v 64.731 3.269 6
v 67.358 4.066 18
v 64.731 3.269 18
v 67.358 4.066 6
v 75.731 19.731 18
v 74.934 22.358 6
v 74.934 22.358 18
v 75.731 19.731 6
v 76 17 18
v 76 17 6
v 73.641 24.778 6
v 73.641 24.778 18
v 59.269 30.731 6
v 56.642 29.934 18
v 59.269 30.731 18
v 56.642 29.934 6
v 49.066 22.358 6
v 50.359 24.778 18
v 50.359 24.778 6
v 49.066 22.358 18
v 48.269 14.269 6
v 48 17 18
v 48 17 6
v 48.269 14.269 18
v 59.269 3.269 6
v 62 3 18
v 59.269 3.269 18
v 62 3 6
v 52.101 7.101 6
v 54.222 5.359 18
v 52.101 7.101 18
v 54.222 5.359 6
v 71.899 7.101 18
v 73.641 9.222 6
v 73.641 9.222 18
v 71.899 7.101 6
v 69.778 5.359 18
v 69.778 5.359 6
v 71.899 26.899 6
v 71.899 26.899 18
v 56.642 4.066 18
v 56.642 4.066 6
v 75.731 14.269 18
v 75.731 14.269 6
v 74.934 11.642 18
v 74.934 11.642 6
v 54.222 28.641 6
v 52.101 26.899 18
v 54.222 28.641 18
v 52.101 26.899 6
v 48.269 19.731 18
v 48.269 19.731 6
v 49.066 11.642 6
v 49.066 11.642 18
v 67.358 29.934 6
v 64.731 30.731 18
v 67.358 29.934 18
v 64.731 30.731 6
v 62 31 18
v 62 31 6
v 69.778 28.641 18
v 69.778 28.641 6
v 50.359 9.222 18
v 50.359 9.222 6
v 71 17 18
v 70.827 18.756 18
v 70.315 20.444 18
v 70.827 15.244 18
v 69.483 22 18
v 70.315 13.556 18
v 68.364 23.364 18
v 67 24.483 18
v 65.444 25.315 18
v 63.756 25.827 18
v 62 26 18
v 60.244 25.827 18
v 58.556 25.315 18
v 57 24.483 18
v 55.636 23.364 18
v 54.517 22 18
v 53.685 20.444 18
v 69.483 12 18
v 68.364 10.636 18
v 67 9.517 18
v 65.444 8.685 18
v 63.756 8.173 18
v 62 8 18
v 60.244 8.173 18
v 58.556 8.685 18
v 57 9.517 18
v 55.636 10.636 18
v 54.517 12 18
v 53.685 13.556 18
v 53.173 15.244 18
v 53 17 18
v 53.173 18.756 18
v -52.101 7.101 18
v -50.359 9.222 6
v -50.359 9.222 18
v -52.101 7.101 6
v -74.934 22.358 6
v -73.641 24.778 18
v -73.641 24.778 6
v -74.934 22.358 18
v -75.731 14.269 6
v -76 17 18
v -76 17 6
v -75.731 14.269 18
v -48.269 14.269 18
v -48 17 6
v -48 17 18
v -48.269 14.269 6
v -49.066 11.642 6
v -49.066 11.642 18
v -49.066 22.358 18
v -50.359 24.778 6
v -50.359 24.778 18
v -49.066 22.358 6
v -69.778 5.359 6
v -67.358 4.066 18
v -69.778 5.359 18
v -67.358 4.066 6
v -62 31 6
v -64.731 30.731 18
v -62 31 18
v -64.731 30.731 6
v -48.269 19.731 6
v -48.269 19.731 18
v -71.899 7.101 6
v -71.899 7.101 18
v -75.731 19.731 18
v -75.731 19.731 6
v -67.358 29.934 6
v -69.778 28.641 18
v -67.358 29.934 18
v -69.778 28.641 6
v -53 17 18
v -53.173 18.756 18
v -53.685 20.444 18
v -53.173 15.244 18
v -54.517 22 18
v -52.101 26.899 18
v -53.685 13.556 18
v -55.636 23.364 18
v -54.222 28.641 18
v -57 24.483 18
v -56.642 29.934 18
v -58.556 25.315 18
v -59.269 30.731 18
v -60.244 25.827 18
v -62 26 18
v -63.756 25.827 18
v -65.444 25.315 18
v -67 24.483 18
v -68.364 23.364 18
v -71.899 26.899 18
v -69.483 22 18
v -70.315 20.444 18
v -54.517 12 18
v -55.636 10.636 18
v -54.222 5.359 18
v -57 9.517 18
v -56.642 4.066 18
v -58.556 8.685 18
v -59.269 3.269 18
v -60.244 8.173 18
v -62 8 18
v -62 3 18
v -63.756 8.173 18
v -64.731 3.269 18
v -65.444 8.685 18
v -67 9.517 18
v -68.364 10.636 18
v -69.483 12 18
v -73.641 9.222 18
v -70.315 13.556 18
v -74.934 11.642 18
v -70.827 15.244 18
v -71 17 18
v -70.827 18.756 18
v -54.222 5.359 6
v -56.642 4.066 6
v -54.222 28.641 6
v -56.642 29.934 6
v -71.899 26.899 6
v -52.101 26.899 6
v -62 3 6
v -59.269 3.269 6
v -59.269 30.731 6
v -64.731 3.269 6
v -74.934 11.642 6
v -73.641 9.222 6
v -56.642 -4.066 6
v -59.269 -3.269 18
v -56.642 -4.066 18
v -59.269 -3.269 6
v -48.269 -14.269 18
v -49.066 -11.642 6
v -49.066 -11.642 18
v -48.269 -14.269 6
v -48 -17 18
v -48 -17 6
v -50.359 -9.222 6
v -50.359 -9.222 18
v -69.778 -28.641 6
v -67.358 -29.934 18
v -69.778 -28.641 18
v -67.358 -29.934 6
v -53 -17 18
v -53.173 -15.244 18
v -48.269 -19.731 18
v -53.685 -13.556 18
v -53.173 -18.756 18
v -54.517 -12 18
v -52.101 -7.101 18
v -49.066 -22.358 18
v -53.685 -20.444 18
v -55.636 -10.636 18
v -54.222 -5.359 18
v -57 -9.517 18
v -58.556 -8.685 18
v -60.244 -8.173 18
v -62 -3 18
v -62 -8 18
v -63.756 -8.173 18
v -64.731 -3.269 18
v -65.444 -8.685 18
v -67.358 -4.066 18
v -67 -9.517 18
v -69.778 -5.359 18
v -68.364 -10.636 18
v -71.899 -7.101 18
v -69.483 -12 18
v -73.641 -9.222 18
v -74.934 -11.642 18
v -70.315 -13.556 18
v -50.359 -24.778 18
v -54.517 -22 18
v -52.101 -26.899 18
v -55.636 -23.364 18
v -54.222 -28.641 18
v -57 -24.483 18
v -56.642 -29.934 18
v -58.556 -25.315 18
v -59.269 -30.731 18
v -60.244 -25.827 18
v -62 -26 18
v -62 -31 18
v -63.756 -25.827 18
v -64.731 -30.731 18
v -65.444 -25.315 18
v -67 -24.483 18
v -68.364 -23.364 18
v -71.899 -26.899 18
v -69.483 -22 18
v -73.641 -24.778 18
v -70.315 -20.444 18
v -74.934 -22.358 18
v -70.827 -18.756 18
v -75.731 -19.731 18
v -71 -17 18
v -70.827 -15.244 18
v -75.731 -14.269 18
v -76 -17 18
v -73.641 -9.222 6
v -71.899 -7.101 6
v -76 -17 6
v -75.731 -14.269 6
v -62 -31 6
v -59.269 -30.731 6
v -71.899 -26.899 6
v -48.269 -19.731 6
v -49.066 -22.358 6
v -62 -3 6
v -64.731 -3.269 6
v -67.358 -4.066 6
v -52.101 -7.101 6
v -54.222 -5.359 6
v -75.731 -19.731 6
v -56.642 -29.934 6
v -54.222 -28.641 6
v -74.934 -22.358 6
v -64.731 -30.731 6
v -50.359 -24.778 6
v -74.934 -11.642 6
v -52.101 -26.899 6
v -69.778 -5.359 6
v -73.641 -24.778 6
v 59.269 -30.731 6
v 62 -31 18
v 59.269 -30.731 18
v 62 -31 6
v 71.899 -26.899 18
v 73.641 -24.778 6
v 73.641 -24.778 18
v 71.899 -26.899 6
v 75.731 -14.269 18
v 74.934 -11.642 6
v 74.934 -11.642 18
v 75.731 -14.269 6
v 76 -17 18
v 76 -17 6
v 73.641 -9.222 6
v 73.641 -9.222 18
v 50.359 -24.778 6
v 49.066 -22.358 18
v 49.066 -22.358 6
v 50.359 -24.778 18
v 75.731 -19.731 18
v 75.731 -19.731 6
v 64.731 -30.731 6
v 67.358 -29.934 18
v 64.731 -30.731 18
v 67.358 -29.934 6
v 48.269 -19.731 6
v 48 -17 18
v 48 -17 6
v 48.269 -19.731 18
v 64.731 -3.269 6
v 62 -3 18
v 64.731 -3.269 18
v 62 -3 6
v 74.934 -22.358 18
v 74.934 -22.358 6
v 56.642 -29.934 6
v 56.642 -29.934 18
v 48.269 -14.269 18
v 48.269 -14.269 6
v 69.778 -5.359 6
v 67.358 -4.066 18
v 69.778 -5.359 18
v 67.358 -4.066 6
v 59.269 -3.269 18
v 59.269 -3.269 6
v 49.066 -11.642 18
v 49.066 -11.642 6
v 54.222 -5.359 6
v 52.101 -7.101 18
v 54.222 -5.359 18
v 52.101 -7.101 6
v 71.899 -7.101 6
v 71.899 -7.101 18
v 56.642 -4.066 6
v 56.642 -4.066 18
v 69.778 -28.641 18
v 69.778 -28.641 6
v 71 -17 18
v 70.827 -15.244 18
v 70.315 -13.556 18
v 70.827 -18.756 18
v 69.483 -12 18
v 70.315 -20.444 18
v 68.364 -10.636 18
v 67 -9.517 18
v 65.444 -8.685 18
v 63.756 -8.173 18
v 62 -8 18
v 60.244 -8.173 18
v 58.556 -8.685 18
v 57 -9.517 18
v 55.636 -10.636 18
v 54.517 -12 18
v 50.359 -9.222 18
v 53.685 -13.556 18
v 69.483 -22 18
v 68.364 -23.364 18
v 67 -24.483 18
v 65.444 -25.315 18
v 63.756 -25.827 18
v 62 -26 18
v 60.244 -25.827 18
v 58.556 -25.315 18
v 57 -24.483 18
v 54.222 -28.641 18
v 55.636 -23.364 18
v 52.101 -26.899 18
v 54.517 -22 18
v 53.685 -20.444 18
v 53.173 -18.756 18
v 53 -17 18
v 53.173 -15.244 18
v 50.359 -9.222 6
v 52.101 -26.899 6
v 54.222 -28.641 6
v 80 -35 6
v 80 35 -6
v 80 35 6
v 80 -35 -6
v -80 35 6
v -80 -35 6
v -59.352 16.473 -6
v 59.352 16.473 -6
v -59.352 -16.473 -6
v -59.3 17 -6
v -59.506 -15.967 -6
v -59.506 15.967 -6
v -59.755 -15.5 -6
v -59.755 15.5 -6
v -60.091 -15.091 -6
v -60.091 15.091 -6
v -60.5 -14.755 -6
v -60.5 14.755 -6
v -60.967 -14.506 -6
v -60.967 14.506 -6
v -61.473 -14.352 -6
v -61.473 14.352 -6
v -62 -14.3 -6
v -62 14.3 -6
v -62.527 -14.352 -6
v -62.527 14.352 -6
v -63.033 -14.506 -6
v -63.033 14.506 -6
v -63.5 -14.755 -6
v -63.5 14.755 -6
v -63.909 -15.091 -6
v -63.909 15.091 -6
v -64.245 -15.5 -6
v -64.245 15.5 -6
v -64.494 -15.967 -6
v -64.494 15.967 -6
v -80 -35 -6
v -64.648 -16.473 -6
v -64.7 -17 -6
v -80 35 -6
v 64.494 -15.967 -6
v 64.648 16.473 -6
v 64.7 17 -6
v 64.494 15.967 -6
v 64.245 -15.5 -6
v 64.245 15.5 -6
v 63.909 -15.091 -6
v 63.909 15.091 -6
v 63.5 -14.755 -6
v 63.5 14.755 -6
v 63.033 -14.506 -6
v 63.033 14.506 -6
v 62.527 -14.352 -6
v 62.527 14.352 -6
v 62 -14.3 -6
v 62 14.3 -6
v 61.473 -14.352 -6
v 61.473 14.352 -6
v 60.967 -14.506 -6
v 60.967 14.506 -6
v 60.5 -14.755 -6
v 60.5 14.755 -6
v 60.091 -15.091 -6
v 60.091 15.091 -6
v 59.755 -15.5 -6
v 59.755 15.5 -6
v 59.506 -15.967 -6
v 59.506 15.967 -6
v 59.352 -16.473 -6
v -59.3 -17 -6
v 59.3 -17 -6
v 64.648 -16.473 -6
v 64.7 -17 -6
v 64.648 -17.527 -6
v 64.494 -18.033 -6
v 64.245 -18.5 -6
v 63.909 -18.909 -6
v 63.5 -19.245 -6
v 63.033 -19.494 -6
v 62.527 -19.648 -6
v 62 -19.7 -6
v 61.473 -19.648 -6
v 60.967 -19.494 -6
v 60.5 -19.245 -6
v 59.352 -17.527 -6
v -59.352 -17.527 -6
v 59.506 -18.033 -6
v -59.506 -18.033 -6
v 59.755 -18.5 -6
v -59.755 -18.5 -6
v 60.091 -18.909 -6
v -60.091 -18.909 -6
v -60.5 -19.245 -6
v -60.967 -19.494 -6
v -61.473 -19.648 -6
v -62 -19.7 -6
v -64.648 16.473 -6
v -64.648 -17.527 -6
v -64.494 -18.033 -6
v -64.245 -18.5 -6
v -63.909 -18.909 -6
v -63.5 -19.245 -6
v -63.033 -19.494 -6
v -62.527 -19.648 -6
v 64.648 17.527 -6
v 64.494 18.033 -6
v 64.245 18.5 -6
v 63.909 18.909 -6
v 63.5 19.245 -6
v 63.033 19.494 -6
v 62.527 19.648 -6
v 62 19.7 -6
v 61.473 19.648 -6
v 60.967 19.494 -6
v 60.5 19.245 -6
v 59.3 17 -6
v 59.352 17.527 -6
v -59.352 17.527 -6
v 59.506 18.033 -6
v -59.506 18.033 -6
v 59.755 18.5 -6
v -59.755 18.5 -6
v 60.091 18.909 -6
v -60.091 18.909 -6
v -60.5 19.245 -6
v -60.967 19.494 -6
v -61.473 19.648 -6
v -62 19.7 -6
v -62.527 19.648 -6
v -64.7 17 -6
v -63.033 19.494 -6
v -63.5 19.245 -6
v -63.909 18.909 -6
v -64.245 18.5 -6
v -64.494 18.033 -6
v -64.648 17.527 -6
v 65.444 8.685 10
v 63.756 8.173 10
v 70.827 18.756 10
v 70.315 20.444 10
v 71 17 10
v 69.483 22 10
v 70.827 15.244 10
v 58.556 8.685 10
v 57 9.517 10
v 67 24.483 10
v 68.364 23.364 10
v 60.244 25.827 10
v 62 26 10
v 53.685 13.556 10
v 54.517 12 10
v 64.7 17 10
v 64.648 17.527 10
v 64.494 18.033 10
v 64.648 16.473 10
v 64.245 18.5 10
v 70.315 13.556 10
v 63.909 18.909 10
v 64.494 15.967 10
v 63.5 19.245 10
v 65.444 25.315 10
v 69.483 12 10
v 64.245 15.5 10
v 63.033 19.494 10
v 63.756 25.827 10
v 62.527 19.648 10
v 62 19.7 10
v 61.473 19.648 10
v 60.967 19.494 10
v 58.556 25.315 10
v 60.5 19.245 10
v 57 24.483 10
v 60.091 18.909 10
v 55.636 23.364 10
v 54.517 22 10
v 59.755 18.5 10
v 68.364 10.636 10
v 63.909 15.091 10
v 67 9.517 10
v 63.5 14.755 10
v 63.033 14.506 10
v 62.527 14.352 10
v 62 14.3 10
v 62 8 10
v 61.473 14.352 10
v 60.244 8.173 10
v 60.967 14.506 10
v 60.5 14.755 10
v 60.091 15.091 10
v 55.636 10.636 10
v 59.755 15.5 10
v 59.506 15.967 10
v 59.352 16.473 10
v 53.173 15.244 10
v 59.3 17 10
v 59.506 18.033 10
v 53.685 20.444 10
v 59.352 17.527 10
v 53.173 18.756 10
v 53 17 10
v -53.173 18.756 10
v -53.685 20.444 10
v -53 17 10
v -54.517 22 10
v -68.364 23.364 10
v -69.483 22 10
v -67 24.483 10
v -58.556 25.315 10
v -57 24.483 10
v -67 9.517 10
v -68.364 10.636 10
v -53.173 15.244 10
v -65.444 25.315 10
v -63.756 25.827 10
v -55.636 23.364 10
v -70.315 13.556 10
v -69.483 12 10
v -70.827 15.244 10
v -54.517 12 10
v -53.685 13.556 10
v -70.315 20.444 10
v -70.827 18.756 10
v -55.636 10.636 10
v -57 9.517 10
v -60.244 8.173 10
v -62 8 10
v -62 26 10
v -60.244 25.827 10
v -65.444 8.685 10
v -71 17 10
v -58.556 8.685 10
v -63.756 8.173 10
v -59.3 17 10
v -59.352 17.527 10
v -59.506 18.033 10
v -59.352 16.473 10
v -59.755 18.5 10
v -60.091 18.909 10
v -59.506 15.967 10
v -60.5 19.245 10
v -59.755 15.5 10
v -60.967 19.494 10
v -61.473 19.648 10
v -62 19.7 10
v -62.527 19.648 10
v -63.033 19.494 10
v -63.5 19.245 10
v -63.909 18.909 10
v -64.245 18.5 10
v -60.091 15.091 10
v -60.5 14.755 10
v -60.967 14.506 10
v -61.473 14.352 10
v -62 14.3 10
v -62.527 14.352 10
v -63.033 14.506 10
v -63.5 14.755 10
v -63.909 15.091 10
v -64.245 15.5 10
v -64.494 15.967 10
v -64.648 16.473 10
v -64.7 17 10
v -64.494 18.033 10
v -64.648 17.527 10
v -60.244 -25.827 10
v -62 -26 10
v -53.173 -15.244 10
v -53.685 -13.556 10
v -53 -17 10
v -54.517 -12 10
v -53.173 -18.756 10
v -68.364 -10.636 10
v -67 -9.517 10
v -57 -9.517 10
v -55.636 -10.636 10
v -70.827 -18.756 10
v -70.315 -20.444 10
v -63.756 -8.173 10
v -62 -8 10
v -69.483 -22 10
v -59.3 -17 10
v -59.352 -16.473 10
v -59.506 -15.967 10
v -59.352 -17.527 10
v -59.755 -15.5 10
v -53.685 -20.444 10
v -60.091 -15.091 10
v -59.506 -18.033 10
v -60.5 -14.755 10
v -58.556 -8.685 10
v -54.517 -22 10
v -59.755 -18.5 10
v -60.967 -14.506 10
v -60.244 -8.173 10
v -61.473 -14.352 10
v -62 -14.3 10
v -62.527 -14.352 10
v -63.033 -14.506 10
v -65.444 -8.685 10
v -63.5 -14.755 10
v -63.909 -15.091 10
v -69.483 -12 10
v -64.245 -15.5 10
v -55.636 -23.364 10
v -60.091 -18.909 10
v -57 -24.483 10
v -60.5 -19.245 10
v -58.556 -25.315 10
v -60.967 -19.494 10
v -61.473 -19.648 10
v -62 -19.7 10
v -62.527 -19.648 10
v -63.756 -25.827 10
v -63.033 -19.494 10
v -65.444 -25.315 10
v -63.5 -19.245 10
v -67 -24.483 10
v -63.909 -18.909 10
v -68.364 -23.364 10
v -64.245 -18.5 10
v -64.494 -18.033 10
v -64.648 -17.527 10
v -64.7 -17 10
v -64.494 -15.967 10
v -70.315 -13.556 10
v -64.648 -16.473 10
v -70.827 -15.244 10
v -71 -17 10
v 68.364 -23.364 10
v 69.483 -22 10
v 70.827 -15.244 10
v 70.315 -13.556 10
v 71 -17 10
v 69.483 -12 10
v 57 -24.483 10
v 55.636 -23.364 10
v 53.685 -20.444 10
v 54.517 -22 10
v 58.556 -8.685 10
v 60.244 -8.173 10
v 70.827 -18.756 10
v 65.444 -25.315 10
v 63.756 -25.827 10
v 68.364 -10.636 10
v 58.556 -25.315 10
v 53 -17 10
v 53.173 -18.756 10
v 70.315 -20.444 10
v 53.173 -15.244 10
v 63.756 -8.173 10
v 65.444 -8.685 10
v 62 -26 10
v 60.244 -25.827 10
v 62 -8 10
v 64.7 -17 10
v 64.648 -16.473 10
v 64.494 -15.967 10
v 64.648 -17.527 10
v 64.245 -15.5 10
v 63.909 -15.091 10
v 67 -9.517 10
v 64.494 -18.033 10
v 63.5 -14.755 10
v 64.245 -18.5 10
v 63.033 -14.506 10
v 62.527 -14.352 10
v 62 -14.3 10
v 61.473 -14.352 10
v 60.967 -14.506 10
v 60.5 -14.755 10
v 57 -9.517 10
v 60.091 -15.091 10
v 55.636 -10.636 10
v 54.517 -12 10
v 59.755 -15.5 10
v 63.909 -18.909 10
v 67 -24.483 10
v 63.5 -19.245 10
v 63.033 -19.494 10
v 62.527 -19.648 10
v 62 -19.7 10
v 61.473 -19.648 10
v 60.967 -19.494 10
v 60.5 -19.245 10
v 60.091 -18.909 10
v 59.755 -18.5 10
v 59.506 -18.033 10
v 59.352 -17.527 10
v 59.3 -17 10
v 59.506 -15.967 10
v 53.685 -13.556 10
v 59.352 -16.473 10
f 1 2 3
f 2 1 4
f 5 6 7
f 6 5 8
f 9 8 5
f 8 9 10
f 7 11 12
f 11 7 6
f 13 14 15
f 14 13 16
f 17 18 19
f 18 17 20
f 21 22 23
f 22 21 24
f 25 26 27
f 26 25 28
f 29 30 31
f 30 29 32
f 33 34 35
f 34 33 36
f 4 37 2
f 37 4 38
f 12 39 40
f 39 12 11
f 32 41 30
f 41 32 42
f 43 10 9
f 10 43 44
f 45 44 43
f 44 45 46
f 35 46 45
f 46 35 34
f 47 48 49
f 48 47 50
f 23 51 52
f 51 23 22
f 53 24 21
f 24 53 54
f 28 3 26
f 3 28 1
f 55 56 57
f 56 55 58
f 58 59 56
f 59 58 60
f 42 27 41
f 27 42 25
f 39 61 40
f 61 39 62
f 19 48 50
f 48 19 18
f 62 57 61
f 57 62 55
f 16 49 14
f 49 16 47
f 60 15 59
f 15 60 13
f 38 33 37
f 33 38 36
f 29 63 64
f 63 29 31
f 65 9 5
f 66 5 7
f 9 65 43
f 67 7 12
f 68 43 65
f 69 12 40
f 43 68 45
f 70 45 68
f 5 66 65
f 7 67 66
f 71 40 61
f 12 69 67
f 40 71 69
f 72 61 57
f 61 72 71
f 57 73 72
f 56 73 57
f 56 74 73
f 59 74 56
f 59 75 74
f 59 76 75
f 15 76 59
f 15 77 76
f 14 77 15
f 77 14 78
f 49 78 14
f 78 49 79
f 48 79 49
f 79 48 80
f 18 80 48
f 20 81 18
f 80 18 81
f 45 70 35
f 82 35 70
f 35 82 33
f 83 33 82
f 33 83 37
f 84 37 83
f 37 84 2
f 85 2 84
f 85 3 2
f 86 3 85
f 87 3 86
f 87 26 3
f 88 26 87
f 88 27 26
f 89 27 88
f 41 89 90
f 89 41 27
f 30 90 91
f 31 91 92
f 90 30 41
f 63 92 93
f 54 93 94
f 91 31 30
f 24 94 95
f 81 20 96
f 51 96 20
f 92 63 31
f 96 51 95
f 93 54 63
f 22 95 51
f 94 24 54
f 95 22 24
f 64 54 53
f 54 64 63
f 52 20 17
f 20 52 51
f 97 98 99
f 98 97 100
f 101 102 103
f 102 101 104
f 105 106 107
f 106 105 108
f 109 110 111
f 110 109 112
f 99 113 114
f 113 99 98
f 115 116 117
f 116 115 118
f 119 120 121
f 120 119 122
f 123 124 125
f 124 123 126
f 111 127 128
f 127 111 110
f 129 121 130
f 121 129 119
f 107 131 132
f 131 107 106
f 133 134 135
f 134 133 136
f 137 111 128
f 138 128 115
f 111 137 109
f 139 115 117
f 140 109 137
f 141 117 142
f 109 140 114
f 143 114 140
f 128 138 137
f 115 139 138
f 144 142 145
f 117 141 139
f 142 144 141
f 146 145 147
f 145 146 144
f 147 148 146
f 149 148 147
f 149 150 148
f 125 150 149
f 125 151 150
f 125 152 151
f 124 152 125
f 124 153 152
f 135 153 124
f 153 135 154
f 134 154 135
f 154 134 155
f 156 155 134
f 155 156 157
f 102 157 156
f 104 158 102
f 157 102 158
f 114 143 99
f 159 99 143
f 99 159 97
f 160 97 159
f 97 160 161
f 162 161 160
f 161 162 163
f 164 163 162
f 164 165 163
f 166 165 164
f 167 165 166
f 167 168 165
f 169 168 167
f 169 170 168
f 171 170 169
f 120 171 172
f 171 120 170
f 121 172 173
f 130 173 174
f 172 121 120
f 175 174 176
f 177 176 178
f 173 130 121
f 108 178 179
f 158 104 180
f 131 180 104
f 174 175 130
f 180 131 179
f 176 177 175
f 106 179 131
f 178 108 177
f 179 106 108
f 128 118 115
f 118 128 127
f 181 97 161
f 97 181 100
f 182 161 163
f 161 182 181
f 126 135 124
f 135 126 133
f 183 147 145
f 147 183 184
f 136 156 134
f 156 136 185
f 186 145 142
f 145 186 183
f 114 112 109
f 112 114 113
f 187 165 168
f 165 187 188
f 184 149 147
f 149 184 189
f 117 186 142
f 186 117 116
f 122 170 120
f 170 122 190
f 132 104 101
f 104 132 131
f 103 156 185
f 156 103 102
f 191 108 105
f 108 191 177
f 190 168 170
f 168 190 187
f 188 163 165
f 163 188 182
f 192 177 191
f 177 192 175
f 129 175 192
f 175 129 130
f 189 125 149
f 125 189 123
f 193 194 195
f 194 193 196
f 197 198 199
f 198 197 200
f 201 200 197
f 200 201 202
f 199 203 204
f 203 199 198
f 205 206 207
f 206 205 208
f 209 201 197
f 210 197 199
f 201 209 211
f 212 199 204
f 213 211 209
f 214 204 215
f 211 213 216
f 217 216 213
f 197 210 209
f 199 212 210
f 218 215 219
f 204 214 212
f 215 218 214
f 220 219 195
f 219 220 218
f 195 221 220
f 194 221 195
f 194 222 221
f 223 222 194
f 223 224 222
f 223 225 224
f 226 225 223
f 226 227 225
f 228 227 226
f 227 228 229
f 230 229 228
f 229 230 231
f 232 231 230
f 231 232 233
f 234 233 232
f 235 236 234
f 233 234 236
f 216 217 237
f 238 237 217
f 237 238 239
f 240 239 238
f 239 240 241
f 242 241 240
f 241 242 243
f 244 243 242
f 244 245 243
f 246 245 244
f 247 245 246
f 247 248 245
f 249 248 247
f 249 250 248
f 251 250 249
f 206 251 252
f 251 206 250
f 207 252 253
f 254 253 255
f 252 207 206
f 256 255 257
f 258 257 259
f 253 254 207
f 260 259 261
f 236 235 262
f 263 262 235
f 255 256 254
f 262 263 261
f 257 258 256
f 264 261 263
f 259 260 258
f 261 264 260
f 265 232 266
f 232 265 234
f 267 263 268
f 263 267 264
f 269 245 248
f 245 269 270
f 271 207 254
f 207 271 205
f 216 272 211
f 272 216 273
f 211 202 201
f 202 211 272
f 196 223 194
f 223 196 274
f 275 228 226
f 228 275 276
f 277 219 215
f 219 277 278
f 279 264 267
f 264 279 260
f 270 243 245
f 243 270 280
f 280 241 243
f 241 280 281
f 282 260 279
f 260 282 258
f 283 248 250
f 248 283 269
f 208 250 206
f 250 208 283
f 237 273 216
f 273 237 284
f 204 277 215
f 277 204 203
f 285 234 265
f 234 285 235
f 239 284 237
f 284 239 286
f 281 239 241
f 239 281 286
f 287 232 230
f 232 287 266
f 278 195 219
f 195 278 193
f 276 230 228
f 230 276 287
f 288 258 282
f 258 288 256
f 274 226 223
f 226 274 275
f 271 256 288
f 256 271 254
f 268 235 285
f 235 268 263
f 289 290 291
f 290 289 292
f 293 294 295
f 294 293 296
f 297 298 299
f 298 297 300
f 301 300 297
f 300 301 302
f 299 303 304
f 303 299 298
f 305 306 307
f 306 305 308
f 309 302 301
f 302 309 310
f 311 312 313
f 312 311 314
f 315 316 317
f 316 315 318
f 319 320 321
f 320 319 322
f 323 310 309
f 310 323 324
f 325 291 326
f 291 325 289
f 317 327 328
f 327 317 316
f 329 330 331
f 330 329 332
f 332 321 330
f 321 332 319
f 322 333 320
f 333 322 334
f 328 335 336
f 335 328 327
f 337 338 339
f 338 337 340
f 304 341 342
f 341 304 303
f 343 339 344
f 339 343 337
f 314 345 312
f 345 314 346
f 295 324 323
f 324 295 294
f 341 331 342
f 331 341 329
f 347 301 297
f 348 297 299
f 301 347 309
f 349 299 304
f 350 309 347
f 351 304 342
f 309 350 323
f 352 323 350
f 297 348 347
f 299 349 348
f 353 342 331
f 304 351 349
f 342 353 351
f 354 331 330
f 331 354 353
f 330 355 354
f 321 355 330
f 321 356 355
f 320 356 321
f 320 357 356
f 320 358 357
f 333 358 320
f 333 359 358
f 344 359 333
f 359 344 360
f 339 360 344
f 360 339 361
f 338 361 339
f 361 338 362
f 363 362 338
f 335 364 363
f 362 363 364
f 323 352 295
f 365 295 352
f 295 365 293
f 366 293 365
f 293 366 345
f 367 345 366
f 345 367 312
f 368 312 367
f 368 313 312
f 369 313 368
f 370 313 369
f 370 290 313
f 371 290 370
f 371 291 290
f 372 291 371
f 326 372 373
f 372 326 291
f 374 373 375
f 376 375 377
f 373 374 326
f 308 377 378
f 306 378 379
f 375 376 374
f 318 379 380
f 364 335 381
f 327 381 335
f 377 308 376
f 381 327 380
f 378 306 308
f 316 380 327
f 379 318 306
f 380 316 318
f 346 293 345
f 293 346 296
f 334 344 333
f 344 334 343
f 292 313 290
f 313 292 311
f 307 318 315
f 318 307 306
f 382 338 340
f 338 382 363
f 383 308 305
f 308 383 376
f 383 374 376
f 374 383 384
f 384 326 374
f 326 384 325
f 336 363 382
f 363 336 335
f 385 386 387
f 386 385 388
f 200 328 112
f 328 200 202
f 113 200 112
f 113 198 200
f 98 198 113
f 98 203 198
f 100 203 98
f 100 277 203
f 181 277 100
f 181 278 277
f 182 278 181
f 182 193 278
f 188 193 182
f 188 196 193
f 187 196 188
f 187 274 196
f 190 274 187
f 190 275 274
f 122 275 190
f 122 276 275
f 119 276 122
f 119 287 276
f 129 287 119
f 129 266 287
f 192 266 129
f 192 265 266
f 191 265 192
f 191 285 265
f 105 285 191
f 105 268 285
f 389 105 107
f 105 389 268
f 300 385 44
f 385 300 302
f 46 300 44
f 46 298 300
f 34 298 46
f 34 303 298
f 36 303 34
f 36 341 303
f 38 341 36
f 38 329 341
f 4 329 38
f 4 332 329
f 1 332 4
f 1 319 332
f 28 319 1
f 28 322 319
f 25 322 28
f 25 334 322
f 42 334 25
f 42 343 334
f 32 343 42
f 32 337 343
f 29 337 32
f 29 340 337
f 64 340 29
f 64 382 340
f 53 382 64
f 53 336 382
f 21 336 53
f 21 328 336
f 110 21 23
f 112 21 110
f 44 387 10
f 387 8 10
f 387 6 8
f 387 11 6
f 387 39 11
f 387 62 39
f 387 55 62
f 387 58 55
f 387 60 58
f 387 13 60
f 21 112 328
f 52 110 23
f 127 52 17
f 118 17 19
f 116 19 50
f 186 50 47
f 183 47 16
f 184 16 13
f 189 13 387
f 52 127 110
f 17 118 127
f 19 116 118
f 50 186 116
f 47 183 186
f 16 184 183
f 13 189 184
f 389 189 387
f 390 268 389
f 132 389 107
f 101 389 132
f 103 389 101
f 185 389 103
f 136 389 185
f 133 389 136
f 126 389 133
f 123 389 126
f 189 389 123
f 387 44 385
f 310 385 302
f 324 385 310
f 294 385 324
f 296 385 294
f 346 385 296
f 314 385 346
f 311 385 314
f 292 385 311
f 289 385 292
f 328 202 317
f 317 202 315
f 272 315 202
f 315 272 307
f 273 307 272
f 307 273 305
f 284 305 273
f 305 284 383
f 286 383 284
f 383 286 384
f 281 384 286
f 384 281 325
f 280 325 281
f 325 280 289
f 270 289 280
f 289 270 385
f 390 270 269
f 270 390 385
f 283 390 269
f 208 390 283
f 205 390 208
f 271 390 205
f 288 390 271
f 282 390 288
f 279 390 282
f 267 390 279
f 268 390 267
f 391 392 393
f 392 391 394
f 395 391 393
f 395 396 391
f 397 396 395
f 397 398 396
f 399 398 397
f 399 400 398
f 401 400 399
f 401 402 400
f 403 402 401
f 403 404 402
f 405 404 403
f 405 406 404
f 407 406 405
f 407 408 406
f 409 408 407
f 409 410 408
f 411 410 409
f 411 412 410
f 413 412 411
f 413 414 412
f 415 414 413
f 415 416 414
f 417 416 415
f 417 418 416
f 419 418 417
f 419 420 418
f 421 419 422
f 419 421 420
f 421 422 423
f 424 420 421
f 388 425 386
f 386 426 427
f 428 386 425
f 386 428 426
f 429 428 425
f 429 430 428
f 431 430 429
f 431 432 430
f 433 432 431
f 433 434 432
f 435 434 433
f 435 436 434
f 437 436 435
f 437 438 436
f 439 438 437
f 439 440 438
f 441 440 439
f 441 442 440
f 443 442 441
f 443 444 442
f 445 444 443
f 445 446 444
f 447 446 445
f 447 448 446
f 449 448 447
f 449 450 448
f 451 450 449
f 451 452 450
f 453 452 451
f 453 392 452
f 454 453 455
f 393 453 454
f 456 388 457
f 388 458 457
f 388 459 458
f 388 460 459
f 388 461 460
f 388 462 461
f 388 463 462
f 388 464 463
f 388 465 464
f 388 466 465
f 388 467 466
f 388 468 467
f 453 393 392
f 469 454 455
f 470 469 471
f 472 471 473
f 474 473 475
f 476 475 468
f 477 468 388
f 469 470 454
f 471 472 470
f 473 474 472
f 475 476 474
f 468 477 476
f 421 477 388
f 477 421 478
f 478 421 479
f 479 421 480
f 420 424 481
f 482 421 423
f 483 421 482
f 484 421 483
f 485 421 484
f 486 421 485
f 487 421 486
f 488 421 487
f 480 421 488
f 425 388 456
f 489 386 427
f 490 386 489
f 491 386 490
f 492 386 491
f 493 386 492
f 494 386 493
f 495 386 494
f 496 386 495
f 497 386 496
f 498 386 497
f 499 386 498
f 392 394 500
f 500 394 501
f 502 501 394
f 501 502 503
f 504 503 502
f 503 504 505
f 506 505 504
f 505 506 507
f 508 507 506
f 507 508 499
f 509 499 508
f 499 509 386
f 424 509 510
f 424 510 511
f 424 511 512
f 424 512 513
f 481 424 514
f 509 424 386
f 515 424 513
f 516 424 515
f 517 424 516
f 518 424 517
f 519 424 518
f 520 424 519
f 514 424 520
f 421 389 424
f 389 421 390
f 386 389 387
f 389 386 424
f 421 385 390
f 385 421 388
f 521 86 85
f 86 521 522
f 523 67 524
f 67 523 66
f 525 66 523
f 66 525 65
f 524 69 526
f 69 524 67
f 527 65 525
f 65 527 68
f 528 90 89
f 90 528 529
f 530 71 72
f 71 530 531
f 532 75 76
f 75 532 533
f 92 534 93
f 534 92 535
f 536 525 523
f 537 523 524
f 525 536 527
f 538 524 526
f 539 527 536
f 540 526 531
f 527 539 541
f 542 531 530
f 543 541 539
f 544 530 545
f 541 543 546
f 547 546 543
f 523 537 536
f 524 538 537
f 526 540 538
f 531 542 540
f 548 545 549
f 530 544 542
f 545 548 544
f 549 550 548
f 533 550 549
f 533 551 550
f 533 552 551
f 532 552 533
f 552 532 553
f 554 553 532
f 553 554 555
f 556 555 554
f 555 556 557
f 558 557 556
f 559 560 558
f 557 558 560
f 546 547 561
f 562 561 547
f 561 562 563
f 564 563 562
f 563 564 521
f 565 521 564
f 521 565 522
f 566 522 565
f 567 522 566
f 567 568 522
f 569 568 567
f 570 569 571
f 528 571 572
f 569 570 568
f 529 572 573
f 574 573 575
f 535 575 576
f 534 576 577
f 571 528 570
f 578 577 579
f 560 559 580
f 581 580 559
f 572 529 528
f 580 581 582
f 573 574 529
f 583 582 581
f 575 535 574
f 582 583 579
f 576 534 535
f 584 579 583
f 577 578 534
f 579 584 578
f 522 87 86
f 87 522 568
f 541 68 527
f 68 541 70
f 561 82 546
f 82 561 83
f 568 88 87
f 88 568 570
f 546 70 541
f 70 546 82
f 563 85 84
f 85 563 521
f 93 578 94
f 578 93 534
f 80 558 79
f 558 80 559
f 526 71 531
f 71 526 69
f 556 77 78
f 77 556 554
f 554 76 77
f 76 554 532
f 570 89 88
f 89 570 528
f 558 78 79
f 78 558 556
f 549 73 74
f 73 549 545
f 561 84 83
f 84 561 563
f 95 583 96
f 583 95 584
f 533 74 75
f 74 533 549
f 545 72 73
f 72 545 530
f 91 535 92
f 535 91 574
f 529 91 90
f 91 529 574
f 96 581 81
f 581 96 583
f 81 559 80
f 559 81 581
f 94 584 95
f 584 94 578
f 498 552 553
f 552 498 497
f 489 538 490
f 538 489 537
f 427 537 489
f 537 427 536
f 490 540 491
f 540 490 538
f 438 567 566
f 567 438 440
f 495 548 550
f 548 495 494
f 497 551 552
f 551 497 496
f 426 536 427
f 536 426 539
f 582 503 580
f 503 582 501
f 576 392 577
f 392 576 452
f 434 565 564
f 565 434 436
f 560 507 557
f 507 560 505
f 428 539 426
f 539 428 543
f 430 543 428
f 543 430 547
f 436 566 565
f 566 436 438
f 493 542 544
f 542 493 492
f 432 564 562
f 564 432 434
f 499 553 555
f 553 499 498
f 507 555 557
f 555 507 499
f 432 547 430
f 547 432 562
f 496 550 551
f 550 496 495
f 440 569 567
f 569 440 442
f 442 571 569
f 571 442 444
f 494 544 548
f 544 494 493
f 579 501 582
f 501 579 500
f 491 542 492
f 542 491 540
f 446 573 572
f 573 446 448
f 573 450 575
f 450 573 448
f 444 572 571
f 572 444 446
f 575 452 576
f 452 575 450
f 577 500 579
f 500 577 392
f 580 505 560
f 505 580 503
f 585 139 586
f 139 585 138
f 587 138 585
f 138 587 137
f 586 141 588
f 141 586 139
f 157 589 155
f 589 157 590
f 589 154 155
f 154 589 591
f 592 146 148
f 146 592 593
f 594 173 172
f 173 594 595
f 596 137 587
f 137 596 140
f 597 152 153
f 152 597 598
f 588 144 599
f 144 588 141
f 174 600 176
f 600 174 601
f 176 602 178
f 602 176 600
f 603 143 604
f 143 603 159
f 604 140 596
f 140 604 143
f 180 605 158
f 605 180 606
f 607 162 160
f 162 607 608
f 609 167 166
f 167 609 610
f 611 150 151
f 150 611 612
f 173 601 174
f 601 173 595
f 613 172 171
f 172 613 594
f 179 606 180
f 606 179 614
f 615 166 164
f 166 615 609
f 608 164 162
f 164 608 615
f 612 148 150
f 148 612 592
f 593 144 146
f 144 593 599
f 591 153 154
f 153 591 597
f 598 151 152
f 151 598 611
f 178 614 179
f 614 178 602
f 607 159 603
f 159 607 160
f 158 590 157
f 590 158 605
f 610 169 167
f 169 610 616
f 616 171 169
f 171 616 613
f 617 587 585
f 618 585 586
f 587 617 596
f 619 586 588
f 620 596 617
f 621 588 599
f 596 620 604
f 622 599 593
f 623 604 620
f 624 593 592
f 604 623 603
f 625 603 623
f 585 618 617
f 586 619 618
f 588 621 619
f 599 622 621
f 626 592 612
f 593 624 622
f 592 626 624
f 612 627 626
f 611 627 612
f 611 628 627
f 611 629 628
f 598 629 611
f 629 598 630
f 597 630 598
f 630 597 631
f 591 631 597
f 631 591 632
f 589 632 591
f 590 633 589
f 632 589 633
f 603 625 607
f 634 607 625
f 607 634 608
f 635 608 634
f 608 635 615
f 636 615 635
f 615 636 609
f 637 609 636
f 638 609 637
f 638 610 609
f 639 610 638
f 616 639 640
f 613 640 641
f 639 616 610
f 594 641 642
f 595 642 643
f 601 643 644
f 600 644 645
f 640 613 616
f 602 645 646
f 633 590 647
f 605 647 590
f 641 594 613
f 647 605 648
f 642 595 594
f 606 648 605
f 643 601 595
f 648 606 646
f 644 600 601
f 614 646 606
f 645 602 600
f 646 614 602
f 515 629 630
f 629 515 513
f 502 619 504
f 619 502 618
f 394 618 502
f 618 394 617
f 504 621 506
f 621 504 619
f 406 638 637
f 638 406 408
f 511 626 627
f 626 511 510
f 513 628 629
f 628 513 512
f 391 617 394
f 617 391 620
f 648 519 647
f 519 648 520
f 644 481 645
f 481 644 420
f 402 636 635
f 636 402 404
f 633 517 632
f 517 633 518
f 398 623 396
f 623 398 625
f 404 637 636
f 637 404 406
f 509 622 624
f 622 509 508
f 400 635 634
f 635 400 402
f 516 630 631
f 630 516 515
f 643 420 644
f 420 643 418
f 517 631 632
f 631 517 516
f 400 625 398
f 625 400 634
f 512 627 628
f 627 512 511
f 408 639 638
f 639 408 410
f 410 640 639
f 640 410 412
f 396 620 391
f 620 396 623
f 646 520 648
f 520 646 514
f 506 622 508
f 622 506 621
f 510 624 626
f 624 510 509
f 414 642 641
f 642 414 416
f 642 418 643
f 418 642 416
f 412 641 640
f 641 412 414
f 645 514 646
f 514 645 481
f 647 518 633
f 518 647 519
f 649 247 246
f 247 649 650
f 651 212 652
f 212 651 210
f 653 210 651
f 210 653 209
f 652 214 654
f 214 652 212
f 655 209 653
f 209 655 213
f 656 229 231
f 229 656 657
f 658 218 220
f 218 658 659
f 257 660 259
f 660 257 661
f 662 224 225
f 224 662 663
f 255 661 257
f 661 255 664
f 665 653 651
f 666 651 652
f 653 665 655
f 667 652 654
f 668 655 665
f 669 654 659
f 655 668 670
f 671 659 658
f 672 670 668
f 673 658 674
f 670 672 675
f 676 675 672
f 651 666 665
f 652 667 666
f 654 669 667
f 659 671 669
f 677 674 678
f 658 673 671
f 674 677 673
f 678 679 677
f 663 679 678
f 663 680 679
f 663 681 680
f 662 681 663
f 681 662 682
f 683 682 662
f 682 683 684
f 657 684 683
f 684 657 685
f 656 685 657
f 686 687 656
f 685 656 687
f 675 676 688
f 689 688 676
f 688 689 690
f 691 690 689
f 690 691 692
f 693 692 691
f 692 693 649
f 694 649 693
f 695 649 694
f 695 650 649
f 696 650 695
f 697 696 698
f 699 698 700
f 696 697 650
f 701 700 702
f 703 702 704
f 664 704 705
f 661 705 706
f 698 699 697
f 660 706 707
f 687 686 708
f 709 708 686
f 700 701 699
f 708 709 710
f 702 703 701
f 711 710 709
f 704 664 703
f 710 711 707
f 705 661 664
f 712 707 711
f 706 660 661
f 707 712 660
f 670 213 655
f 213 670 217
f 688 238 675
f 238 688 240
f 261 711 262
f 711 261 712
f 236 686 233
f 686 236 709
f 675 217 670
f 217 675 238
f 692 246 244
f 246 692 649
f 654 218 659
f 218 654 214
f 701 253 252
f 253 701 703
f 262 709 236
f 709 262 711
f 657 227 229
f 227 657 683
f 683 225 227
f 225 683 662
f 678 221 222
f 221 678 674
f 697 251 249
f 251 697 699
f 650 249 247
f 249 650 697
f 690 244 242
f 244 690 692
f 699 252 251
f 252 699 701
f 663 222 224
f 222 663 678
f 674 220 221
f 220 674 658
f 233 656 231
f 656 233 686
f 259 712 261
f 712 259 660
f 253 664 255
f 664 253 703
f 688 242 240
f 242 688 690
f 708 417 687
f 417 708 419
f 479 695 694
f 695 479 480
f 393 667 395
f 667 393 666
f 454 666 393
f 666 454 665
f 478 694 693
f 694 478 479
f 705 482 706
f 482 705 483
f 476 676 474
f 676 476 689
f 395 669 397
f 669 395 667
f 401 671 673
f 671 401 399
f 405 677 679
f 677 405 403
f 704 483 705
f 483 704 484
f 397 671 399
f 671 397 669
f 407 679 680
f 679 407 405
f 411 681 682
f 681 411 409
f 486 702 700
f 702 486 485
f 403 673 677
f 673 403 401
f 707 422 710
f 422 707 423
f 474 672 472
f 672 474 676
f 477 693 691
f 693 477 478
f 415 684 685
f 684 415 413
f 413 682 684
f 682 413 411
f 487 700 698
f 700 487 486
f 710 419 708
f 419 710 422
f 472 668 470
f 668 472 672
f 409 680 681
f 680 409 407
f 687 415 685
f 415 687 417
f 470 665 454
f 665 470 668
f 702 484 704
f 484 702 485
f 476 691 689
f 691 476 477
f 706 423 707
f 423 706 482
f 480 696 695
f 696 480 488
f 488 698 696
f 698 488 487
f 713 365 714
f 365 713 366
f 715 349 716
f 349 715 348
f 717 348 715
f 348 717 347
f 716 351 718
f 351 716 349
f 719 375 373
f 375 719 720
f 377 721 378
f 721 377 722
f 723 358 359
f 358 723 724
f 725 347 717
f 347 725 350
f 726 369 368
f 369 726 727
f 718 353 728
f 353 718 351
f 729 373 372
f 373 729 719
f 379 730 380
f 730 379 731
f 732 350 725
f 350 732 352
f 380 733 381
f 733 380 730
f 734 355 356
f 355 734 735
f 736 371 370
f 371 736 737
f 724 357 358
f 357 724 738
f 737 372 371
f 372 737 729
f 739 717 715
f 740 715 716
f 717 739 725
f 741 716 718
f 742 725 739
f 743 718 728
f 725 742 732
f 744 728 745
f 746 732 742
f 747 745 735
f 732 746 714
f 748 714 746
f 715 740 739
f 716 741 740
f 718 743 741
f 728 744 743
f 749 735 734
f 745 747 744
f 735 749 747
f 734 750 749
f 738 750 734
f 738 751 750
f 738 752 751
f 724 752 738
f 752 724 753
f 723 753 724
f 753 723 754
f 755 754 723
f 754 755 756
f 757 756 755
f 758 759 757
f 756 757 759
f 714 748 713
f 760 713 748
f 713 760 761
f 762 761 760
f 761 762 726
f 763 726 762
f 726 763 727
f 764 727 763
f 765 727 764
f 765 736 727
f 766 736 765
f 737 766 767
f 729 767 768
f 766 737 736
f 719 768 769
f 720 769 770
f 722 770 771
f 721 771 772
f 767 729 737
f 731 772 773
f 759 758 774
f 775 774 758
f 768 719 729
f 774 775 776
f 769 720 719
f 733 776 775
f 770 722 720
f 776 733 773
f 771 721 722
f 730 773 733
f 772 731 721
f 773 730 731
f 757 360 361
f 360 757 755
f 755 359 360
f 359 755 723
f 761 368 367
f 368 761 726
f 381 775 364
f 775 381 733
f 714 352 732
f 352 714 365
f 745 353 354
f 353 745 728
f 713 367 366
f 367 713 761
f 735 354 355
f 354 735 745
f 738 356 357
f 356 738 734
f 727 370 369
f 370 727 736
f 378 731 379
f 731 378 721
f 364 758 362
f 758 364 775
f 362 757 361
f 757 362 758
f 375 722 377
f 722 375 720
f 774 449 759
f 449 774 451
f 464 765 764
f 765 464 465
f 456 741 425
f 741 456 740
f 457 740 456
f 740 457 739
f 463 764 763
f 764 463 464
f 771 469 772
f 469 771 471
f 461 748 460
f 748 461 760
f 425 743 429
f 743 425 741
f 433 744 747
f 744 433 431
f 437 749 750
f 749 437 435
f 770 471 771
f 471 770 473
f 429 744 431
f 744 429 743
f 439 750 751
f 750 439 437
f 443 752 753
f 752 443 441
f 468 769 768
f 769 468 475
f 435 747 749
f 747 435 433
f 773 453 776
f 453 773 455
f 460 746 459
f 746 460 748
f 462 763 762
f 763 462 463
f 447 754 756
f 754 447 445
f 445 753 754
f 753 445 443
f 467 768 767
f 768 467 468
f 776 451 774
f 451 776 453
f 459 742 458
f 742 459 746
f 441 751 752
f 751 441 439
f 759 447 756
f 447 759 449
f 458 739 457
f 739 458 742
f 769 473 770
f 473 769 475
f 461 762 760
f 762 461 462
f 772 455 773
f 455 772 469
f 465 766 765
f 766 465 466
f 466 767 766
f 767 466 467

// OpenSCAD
$fn = 32;

// ----------------------------------------------------------------------
// Socket pad plate
// bosses with counterbored sockets for the screws
// ----------------------------------------------------------------------

// --- parameters (mm) ---
base_t = 12;            // base plate thickness
boss_h = 12;            // boss height above the base plate
boss_d = 28;            // boss diameter
socket_d = 18;          // socket diameter
socket_depth = 8;       // socket depth from the boss face
bolt_d = 5.4;           // screw clearance hole through the socket floor
plate = [160, 70, 12];  // overall size (x, y, z)
edge = 18;              // boss centre offset from the plate edge
pads = 4;               // boss count, one per corner

// --- derived feature positions (mm) ---
height = base_t + boss_h;        // = 24   overall height of the part
corner_x = plate[0] / 2 - edge;  // = 62   boss centre X
corner_y = plate[1] / 2 - edge;  // = 17   boss centre Y
feature_centers = [
  [corner_x, corner_y],
  [-corner_x, corner_y],
  [-corner_x, -corner_y],
  [corner_x, -corner_y]
];   // boss centres: sockets, holes and the pads themselves are placed from here

// base plate, bosses on feature_centers, socket + through hole in each
difference() {
  union() {
    cube(plate, center = true);
    for (centre = feature_centers)
      translate([centre[0], centre[1], plate[2] / 2 - 1])
        cylinder(d = boss_d, h = boss_h + 1);
  }
  for (centre = feature_centers) {
    translate([centre[0], centre[1], plate[2] / 2 + boss_h - socket_depth])
      cylinder(d = socket_d, h = socket_depth + 1);
    translate([centre[0], centre[1], -height])
      cylinder(d = bolt_d, h = 2 * height + 2);  // through the socket floor
  }
}
